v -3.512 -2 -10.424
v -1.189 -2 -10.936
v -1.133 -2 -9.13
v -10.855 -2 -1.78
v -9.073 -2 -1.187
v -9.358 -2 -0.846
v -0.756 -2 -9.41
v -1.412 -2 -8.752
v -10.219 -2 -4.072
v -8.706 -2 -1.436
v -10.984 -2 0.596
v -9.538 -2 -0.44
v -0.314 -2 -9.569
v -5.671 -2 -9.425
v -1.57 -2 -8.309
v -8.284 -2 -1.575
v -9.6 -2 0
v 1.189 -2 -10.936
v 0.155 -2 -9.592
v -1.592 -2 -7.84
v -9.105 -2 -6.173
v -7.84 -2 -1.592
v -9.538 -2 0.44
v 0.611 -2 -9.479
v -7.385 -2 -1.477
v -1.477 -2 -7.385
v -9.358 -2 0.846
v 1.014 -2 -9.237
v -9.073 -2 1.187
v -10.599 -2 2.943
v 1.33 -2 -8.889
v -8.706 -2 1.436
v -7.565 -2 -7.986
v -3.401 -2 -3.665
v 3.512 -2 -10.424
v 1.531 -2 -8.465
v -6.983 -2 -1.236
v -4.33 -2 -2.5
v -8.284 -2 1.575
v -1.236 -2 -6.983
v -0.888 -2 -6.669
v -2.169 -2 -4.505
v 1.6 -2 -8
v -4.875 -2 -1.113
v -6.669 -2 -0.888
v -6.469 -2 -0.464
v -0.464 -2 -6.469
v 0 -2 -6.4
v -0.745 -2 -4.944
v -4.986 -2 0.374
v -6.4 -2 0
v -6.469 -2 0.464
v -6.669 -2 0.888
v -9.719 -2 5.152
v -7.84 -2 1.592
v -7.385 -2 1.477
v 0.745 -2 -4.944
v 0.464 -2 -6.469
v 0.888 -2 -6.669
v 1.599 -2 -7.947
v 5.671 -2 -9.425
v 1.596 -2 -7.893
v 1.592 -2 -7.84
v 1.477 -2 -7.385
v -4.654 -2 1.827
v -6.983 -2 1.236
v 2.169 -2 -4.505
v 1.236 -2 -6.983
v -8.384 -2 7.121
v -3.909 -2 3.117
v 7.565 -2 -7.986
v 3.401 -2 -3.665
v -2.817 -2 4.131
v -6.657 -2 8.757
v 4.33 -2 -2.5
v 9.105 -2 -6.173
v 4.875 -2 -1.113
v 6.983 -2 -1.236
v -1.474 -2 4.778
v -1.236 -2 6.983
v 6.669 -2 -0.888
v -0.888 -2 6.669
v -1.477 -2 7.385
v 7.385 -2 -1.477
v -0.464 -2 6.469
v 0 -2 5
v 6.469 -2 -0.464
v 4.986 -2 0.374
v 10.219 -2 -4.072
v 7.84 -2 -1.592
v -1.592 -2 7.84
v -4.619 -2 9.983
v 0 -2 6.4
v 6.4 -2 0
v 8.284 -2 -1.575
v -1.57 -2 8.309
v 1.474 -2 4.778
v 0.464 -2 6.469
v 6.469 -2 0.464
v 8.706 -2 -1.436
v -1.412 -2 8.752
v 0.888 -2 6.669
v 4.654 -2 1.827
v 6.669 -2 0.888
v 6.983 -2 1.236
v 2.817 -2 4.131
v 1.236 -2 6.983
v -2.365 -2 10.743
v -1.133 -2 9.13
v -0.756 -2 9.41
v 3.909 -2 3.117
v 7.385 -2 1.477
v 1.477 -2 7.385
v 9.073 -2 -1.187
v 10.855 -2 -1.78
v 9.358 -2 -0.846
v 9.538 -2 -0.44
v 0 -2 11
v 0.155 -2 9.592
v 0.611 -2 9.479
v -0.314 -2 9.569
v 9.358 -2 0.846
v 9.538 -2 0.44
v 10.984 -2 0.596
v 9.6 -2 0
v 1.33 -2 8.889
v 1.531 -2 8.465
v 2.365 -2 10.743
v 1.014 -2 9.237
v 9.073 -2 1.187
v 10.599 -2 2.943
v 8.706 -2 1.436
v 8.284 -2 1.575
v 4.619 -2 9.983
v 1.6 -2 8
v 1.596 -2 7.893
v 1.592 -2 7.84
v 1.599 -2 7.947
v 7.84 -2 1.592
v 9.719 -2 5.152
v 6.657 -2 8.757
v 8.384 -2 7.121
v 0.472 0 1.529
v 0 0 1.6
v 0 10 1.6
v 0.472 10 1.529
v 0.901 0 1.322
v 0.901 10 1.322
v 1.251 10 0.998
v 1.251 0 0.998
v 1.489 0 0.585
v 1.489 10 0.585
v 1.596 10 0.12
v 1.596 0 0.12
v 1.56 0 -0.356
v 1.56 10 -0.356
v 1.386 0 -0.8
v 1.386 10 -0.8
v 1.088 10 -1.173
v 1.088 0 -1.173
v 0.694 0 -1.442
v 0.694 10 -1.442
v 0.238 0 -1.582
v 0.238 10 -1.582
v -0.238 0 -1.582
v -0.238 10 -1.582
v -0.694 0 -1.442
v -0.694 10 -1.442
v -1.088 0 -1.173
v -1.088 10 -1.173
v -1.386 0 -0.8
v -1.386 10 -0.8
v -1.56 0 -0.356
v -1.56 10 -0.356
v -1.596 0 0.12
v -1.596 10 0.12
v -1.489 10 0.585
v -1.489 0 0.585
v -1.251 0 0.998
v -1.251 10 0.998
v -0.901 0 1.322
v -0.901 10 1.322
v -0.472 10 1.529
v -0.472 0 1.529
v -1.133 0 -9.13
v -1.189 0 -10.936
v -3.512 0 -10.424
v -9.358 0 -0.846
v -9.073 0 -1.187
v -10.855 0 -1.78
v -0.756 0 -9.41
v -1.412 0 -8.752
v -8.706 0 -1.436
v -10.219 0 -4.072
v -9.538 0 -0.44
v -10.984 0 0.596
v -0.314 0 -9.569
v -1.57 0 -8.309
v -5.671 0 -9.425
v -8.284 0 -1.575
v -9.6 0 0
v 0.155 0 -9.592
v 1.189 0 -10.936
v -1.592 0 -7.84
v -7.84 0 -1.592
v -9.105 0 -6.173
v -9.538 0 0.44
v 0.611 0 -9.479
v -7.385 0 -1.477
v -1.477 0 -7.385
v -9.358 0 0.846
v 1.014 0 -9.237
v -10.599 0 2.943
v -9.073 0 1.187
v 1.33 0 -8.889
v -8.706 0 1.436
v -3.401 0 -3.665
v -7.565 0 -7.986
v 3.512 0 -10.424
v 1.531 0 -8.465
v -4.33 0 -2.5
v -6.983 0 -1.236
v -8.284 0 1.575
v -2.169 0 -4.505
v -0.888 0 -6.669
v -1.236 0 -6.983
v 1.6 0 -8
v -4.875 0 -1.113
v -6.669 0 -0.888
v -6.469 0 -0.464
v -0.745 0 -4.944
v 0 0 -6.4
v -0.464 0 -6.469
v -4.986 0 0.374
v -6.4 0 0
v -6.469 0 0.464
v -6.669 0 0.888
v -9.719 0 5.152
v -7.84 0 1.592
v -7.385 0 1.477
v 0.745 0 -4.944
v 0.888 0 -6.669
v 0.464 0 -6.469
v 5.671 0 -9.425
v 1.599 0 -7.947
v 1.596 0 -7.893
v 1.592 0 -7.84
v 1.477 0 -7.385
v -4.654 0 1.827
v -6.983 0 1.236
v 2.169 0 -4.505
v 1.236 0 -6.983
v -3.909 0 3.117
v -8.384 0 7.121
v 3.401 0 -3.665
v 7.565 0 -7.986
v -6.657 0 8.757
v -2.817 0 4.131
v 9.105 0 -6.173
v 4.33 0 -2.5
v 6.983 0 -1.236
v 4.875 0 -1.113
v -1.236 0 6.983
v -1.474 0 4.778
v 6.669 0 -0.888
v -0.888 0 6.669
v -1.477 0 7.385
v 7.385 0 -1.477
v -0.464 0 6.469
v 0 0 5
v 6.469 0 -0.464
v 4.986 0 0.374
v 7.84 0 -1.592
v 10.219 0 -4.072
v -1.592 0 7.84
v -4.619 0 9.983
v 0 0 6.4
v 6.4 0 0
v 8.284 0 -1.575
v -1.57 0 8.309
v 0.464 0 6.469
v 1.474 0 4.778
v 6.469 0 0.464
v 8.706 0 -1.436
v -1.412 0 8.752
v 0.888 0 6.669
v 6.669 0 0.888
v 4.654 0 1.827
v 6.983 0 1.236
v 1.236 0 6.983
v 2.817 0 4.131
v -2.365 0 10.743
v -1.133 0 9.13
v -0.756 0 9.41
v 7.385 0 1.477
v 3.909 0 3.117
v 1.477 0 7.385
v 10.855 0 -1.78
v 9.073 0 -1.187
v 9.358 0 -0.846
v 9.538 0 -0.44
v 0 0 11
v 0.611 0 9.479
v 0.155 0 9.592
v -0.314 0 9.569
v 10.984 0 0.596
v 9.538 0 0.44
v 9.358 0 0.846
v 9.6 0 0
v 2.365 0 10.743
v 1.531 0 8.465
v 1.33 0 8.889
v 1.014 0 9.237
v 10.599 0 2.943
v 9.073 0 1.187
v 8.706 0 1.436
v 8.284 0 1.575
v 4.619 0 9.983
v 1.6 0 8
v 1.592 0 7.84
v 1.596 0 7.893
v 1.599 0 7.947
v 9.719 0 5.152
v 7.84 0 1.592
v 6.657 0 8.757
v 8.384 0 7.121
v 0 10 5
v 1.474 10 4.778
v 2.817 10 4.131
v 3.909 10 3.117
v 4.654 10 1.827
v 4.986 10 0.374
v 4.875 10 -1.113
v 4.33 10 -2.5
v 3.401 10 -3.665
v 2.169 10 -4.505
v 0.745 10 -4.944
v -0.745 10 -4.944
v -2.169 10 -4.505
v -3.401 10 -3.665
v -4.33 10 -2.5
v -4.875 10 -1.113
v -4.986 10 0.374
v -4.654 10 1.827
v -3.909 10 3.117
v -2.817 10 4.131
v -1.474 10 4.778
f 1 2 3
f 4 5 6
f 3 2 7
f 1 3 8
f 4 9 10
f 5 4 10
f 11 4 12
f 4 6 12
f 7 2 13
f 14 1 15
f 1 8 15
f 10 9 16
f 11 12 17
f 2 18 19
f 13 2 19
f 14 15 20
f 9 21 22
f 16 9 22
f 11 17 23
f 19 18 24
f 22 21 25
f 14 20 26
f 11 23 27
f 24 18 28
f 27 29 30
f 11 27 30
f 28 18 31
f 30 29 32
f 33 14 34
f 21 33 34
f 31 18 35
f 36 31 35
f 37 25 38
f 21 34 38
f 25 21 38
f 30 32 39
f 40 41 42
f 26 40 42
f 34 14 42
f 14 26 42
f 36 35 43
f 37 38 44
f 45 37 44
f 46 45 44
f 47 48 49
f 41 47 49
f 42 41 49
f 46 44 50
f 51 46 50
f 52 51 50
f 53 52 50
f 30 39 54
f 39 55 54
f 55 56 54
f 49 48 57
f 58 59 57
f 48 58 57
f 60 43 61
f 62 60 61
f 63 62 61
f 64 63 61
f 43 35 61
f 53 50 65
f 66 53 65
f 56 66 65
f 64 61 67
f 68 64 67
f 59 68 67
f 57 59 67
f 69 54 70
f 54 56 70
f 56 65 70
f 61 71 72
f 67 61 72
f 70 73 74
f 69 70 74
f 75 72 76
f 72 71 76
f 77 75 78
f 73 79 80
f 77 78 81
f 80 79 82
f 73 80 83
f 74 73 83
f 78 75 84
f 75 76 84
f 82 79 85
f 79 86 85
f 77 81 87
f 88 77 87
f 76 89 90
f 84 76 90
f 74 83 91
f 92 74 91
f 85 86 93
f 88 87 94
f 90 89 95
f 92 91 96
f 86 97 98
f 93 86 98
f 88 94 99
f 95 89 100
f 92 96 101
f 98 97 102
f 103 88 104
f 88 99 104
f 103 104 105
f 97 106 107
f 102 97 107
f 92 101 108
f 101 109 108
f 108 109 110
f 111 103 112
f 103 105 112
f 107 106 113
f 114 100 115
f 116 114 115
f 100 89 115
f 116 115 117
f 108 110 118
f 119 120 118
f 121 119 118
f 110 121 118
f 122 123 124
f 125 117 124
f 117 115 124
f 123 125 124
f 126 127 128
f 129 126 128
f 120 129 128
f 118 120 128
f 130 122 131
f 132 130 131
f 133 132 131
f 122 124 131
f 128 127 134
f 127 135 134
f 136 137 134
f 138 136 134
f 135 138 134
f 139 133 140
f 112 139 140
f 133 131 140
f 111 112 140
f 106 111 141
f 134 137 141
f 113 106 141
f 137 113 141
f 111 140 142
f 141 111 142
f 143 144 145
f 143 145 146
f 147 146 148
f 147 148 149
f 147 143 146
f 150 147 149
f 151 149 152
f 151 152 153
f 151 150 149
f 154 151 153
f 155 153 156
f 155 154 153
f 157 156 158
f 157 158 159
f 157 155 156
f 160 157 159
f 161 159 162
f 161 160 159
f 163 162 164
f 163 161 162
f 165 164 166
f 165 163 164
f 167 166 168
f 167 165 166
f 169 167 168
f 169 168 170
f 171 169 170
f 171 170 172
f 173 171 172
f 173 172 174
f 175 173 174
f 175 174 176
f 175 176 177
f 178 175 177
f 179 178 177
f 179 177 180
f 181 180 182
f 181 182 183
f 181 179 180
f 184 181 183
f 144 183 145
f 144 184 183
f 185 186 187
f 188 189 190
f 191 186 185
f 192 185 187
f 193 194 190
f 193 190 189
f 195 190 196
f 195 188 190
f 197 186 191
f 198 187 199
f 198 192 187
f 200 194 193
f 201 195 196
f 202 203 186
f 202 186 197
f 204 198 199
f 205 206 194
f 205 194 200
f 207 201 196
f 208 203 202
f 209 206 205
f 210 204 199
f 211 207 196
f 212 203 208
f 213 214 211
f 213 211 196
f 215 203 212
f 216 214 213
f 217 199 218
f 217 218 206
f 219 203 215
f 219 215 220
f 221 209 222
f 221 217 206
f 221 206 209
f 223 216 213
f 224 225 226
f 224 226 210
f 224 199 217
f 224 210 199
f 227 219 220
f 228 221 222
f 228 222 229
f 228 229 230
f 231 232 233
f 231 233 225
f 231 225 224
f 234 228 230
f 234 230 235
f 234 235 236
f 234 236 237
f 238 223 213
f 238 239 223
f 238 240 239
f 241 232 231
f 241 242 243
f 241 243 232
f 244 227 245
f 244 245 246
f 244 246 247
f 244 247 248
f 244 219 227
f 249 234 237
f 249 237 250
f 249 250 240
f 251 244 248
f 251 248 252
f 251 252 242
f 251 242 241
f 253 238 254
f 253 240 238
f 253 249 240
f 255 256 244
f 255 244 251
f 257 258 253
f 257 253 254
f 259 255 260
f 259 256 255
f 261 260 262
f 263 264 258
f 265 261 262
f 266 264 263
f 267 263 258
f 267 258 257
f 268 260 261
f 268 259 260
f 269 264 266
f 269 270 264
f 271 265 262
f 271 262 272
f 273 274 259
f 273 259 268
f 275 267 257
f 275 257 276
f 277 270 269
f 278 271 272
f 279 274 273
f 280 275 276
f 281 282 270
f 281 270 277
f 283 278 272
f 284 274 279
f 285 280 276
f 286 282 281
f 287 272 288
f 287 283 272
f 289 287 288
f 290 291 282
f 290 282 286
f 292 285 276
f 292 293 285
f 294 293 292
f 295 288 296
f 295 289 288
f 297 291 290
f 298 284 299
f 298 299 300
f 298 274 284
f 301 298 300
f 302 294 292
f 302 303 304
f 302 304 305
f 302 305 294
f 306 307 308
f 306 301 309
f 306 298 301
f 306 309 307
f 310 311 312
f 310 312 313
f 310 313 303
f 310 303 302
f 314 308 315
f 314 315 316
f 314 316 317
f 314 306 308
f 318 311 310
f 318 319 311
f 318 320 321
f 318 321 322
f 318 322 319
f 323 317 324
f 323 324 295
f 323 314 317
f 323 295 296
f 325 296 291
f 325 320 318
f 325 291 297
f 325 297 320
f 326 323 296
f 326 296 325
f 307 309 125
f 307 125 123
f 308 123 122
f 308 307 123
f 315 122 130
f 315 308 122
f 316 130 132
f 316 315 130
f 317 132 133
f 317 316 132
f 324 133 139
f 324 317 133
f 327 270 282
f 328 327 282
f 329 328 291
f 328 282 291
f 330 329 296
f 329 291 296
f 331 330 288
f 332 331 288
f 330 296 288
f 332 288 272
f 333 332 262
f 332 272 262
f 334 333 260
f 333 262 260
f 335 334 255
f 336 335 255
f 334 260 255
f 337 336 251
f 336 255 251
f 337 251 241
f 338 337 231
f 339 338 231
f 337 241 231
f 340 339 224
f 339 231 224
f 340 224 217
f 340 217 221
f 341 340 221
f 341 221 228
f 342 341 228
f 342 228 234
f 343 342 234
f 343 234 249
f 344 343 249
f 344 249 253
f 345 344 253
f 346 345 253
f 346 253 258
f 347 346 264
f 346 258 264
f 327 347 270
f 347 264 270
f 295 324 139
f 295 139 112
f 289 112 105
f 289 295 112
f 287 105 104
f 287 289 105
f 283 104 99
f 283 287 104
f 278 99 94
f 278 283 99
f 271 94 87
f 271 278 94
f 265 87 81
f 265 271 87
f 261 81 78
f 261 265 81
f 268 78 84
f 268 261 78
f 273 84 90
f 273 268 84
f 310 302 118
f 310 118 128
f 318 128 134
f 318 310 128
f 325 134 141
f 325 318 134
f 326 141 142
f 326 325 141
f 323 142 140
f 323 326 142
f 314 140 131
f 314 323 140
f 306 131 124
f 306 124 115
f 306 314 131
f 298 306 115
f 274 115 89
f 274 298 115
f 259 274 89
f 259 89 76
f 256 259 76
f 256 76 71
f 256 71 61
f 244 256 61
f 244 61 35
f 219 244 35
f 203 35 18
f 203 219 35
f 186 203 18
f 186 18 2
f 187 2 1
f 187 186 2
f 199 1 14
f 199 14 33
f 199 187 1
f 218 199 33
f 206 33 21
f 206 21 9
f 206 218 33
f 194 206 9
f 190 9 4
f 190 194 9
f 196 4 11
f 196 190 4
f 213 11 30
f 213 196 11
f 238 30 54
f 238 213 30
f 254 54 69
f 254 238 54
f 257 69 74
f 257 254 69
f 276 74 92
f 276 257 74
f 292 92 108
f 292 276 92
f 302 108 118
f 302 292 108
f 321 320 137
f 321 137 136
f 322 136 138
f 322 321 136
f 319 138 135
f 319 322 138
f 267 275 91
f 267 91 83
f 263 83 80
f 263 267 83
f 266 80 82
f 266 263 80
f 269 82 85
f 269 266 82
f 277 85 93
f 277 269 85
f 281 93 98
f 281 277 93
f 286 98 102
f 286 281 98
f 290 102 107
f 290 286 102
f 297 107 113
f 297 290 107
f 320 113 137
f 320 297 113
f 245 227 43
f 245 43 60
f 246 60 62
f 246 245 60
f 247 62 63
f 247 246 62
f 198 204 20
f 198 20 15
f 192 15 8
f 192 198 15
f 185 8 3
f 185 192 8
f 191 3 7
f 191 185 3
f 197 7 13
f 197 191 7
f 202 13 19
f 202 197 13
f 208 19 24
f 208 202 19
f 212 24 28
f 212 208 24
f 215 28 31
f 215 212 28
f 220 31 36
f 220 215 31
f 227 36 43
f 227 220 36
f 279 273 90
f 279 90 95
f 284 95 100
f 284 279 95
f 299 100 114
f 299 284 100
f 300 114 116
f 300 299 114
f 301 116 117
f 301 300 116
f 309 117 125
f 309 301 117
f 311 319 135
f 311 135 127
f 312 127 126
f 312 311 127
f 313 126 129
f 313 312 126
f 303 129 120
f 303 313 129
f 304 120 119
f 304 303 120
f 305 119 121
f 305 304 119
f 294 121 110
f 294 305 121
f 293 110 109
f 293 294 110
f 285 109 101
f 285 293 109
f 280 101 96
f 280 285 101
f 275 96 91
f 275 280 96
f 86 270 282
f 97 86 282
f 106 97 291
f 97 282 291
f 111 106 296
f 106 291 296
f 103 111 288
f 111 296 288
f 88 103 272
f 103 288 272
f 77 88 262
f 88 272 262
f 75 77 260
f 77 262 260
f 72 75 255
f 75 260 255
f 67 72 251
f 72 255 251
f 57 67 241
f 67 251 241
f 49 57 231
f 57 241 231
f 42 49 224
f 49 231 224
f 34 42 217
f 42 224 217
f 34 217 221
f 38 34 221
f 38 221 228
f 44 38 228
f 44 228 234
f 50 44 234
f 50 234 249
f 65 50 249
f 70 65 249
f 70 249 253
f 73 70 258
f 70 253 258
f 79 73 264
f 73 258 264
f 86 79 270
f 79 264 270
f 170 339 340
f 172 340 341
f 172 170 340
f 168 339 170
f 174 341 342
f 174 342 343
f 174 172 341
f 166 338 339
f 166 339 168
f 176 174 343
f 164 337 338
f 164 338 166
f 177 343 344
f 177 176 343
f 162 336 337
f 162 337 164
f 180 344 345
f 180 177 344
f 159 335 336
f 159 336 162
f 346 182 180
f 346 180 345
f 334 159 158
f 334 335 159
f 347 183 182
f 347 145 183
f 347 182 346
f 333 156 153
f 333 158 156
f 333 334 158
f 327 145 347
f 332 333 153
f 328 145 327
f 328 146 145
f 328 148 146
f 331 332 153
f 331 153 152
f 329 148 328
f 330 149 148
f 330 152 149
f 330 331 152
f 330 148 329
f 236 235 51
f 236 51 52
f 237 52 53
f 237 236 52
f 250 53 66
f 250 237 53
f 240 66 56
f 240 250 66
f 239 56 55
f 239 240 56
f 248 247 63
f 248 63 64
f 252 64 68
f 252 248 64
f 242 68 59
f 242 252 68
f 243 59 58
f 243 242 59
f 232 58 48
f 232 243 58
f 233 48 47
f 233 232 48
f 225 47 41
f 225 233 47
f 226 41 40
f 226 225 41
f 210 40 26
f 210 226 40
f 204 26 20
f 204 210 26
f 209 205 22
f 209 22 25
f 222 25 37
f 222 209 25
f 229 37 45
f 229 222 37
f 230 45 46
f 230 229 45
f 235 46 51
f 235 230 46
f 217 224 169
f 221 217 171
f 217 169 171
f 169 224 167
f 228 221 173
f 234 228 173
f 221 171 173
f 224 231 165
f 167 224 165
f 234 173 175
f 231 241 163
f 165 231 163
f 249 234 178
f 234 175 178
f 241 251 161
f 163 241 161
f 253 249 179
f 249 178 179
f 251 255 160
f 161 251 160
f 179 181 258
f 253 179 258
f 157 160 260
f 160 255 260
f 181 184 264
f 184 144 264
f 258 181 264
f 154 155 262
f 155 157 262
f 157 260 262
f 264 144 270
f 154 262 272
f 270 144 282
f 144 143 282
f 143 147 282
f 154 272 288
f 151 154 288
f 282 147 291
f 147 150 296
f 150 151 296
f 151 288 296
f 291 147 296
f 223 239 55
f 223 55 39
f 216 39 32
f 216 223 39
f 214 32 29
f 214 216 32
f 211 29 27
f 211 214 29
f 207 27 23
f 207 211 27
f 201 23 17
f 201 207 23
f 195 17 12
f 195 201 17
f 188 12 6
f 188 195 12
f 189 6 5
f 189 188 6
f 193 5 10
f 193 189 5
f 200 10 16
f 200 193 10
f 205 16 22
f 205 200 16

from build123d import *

# Parameters (mm, degrees)
SKETCH_1_R      = 5
SKETCH_1_R_2    = 1.6
EXTRUDE_1_DEPTH = 10
SKETCH_1_3_R    = 5
EXTRUDE_2_DEPTH = 2
SKETCH_1_4_R    = 11
EXTRUDE_3_DEPTH = 2


with BuildPart() as part:
    # 草图1 → 凸台-拉伸1 (new body)
    with BuildSketch(Plane(origin=(0, 0, 0), x_dir=(1, 0, 0), z_dir=(0, 1, 0))):
        Circle(SKETCH_1_R)
        Circle(SKETCH_1_R_2, mode=Mode.SUBTRACT)
    extrude(amount=EXTRUDE_1_DEPTH)


with BuildPart() as body_2:
    # 草图1<3> → 凸台-拉伸2 (new body)
    with BuildSketch(Plane(origin=(0, 0, 0), x_dir=(1, 0, 0), z_dir=(0, 1, 0))):
        with BuildLine():
            ThreePointArc((7.84, -1.591979899), (6.4, 0), (7.84, 1.591979899))
            ThreePointArc((7.84, 1.591979899), (5.656854249, 5.656854249), (1.591979899, 7.84))
            ThreePointArc((1.591979899, 7.84), (0, 6.4), (-1.591979899, 7.84))
            ThreePointArc((-1.591979899, 7.84), (-5.656854249, 5.656854249), (-7.84, 1.591979899))
            ThreePointArc((-7.84, 1.591979899), (-6.813408242, 1.073312629), (-6.4, 0))
            ThreePointArc((-6.4, 0), (-6.813408242, -1.073312629), (-7.84, -1.591979899))
            ThreePointArc((-7.84, -1.591979899), (-5.656854249, -5.656854249), (-1.591979899, -7.84))
            ThreePointArc((-1.591979899, -7.84), (0, -6.4), (1.591979899, -7.84))
            ThreePointArc((1.591979899, -7.84), (5.656854249, -5.656854249), (7.84, -1.591979899))
        make_face()
        Circle(SKETCH_1_3_R, mode=Mode.SUBTRACT)
    extrude(amount=-EXTRUDE_2_DEPTH)

    # 草图1<4> → 凸台-拉伸3 (add)
    with BuildSketch(Plane(origin=(0, 0, 0), x_dir=(1, 0, 0), z_dir=(0, 1, 0))):
        Circle(SKETCH_1_4_R)
        with BuildLine():
            ThreePointArc((1.591979899, 7.84), (5.656854249, 5.656854249), (7.84, 1.591979899))
            ThreePointArc((7.84, 1.591979899), (9.073312629, 1.186591758), (9.6, 0))
            ThreePointArc((9.6, 0), (9.073312629, -1.186591758), (7.84, -1.591979899))
            ThreePointArc((7.84, -1.591979899), (5.656854249, -5.656854249), (1.591979899, -7.84))
            ThreePointArc((1.591979899, -7.84), (1.597993717, -7.91989956), (1.6, -8))
            ThreePointArc((1.6, -8), (-0.08010044, -9.597993717), (-1.591979899, -7.84))
            ThreePointArc((-1.591979899, -7.84), (-5.656854249, -5.656854249), (-7.84, -1.591979899))
            ThreePointArc((-7.84, -1.591979899), (-9.6, 0), (-7.84, 1.591979899))
            ThreePointArc((-7.84, 1.591979899), (-5.656854249, 5.656854249), (-1.591979899, 7.84))
            ThreePointArc((-1.591979899, 7.84), (-0.08010044, 9.597993717), (1.6, 8))
            ThreePointArc((1.6, 8), (1.597993717, 7.91989956), (1.591979899, 7.84))
        make_face(mode=Mode.SUBTRACT)
    extrude(amount=-EXTRUDE_3_DEPTH)


solid = Compound([part.part, body_2.part])
